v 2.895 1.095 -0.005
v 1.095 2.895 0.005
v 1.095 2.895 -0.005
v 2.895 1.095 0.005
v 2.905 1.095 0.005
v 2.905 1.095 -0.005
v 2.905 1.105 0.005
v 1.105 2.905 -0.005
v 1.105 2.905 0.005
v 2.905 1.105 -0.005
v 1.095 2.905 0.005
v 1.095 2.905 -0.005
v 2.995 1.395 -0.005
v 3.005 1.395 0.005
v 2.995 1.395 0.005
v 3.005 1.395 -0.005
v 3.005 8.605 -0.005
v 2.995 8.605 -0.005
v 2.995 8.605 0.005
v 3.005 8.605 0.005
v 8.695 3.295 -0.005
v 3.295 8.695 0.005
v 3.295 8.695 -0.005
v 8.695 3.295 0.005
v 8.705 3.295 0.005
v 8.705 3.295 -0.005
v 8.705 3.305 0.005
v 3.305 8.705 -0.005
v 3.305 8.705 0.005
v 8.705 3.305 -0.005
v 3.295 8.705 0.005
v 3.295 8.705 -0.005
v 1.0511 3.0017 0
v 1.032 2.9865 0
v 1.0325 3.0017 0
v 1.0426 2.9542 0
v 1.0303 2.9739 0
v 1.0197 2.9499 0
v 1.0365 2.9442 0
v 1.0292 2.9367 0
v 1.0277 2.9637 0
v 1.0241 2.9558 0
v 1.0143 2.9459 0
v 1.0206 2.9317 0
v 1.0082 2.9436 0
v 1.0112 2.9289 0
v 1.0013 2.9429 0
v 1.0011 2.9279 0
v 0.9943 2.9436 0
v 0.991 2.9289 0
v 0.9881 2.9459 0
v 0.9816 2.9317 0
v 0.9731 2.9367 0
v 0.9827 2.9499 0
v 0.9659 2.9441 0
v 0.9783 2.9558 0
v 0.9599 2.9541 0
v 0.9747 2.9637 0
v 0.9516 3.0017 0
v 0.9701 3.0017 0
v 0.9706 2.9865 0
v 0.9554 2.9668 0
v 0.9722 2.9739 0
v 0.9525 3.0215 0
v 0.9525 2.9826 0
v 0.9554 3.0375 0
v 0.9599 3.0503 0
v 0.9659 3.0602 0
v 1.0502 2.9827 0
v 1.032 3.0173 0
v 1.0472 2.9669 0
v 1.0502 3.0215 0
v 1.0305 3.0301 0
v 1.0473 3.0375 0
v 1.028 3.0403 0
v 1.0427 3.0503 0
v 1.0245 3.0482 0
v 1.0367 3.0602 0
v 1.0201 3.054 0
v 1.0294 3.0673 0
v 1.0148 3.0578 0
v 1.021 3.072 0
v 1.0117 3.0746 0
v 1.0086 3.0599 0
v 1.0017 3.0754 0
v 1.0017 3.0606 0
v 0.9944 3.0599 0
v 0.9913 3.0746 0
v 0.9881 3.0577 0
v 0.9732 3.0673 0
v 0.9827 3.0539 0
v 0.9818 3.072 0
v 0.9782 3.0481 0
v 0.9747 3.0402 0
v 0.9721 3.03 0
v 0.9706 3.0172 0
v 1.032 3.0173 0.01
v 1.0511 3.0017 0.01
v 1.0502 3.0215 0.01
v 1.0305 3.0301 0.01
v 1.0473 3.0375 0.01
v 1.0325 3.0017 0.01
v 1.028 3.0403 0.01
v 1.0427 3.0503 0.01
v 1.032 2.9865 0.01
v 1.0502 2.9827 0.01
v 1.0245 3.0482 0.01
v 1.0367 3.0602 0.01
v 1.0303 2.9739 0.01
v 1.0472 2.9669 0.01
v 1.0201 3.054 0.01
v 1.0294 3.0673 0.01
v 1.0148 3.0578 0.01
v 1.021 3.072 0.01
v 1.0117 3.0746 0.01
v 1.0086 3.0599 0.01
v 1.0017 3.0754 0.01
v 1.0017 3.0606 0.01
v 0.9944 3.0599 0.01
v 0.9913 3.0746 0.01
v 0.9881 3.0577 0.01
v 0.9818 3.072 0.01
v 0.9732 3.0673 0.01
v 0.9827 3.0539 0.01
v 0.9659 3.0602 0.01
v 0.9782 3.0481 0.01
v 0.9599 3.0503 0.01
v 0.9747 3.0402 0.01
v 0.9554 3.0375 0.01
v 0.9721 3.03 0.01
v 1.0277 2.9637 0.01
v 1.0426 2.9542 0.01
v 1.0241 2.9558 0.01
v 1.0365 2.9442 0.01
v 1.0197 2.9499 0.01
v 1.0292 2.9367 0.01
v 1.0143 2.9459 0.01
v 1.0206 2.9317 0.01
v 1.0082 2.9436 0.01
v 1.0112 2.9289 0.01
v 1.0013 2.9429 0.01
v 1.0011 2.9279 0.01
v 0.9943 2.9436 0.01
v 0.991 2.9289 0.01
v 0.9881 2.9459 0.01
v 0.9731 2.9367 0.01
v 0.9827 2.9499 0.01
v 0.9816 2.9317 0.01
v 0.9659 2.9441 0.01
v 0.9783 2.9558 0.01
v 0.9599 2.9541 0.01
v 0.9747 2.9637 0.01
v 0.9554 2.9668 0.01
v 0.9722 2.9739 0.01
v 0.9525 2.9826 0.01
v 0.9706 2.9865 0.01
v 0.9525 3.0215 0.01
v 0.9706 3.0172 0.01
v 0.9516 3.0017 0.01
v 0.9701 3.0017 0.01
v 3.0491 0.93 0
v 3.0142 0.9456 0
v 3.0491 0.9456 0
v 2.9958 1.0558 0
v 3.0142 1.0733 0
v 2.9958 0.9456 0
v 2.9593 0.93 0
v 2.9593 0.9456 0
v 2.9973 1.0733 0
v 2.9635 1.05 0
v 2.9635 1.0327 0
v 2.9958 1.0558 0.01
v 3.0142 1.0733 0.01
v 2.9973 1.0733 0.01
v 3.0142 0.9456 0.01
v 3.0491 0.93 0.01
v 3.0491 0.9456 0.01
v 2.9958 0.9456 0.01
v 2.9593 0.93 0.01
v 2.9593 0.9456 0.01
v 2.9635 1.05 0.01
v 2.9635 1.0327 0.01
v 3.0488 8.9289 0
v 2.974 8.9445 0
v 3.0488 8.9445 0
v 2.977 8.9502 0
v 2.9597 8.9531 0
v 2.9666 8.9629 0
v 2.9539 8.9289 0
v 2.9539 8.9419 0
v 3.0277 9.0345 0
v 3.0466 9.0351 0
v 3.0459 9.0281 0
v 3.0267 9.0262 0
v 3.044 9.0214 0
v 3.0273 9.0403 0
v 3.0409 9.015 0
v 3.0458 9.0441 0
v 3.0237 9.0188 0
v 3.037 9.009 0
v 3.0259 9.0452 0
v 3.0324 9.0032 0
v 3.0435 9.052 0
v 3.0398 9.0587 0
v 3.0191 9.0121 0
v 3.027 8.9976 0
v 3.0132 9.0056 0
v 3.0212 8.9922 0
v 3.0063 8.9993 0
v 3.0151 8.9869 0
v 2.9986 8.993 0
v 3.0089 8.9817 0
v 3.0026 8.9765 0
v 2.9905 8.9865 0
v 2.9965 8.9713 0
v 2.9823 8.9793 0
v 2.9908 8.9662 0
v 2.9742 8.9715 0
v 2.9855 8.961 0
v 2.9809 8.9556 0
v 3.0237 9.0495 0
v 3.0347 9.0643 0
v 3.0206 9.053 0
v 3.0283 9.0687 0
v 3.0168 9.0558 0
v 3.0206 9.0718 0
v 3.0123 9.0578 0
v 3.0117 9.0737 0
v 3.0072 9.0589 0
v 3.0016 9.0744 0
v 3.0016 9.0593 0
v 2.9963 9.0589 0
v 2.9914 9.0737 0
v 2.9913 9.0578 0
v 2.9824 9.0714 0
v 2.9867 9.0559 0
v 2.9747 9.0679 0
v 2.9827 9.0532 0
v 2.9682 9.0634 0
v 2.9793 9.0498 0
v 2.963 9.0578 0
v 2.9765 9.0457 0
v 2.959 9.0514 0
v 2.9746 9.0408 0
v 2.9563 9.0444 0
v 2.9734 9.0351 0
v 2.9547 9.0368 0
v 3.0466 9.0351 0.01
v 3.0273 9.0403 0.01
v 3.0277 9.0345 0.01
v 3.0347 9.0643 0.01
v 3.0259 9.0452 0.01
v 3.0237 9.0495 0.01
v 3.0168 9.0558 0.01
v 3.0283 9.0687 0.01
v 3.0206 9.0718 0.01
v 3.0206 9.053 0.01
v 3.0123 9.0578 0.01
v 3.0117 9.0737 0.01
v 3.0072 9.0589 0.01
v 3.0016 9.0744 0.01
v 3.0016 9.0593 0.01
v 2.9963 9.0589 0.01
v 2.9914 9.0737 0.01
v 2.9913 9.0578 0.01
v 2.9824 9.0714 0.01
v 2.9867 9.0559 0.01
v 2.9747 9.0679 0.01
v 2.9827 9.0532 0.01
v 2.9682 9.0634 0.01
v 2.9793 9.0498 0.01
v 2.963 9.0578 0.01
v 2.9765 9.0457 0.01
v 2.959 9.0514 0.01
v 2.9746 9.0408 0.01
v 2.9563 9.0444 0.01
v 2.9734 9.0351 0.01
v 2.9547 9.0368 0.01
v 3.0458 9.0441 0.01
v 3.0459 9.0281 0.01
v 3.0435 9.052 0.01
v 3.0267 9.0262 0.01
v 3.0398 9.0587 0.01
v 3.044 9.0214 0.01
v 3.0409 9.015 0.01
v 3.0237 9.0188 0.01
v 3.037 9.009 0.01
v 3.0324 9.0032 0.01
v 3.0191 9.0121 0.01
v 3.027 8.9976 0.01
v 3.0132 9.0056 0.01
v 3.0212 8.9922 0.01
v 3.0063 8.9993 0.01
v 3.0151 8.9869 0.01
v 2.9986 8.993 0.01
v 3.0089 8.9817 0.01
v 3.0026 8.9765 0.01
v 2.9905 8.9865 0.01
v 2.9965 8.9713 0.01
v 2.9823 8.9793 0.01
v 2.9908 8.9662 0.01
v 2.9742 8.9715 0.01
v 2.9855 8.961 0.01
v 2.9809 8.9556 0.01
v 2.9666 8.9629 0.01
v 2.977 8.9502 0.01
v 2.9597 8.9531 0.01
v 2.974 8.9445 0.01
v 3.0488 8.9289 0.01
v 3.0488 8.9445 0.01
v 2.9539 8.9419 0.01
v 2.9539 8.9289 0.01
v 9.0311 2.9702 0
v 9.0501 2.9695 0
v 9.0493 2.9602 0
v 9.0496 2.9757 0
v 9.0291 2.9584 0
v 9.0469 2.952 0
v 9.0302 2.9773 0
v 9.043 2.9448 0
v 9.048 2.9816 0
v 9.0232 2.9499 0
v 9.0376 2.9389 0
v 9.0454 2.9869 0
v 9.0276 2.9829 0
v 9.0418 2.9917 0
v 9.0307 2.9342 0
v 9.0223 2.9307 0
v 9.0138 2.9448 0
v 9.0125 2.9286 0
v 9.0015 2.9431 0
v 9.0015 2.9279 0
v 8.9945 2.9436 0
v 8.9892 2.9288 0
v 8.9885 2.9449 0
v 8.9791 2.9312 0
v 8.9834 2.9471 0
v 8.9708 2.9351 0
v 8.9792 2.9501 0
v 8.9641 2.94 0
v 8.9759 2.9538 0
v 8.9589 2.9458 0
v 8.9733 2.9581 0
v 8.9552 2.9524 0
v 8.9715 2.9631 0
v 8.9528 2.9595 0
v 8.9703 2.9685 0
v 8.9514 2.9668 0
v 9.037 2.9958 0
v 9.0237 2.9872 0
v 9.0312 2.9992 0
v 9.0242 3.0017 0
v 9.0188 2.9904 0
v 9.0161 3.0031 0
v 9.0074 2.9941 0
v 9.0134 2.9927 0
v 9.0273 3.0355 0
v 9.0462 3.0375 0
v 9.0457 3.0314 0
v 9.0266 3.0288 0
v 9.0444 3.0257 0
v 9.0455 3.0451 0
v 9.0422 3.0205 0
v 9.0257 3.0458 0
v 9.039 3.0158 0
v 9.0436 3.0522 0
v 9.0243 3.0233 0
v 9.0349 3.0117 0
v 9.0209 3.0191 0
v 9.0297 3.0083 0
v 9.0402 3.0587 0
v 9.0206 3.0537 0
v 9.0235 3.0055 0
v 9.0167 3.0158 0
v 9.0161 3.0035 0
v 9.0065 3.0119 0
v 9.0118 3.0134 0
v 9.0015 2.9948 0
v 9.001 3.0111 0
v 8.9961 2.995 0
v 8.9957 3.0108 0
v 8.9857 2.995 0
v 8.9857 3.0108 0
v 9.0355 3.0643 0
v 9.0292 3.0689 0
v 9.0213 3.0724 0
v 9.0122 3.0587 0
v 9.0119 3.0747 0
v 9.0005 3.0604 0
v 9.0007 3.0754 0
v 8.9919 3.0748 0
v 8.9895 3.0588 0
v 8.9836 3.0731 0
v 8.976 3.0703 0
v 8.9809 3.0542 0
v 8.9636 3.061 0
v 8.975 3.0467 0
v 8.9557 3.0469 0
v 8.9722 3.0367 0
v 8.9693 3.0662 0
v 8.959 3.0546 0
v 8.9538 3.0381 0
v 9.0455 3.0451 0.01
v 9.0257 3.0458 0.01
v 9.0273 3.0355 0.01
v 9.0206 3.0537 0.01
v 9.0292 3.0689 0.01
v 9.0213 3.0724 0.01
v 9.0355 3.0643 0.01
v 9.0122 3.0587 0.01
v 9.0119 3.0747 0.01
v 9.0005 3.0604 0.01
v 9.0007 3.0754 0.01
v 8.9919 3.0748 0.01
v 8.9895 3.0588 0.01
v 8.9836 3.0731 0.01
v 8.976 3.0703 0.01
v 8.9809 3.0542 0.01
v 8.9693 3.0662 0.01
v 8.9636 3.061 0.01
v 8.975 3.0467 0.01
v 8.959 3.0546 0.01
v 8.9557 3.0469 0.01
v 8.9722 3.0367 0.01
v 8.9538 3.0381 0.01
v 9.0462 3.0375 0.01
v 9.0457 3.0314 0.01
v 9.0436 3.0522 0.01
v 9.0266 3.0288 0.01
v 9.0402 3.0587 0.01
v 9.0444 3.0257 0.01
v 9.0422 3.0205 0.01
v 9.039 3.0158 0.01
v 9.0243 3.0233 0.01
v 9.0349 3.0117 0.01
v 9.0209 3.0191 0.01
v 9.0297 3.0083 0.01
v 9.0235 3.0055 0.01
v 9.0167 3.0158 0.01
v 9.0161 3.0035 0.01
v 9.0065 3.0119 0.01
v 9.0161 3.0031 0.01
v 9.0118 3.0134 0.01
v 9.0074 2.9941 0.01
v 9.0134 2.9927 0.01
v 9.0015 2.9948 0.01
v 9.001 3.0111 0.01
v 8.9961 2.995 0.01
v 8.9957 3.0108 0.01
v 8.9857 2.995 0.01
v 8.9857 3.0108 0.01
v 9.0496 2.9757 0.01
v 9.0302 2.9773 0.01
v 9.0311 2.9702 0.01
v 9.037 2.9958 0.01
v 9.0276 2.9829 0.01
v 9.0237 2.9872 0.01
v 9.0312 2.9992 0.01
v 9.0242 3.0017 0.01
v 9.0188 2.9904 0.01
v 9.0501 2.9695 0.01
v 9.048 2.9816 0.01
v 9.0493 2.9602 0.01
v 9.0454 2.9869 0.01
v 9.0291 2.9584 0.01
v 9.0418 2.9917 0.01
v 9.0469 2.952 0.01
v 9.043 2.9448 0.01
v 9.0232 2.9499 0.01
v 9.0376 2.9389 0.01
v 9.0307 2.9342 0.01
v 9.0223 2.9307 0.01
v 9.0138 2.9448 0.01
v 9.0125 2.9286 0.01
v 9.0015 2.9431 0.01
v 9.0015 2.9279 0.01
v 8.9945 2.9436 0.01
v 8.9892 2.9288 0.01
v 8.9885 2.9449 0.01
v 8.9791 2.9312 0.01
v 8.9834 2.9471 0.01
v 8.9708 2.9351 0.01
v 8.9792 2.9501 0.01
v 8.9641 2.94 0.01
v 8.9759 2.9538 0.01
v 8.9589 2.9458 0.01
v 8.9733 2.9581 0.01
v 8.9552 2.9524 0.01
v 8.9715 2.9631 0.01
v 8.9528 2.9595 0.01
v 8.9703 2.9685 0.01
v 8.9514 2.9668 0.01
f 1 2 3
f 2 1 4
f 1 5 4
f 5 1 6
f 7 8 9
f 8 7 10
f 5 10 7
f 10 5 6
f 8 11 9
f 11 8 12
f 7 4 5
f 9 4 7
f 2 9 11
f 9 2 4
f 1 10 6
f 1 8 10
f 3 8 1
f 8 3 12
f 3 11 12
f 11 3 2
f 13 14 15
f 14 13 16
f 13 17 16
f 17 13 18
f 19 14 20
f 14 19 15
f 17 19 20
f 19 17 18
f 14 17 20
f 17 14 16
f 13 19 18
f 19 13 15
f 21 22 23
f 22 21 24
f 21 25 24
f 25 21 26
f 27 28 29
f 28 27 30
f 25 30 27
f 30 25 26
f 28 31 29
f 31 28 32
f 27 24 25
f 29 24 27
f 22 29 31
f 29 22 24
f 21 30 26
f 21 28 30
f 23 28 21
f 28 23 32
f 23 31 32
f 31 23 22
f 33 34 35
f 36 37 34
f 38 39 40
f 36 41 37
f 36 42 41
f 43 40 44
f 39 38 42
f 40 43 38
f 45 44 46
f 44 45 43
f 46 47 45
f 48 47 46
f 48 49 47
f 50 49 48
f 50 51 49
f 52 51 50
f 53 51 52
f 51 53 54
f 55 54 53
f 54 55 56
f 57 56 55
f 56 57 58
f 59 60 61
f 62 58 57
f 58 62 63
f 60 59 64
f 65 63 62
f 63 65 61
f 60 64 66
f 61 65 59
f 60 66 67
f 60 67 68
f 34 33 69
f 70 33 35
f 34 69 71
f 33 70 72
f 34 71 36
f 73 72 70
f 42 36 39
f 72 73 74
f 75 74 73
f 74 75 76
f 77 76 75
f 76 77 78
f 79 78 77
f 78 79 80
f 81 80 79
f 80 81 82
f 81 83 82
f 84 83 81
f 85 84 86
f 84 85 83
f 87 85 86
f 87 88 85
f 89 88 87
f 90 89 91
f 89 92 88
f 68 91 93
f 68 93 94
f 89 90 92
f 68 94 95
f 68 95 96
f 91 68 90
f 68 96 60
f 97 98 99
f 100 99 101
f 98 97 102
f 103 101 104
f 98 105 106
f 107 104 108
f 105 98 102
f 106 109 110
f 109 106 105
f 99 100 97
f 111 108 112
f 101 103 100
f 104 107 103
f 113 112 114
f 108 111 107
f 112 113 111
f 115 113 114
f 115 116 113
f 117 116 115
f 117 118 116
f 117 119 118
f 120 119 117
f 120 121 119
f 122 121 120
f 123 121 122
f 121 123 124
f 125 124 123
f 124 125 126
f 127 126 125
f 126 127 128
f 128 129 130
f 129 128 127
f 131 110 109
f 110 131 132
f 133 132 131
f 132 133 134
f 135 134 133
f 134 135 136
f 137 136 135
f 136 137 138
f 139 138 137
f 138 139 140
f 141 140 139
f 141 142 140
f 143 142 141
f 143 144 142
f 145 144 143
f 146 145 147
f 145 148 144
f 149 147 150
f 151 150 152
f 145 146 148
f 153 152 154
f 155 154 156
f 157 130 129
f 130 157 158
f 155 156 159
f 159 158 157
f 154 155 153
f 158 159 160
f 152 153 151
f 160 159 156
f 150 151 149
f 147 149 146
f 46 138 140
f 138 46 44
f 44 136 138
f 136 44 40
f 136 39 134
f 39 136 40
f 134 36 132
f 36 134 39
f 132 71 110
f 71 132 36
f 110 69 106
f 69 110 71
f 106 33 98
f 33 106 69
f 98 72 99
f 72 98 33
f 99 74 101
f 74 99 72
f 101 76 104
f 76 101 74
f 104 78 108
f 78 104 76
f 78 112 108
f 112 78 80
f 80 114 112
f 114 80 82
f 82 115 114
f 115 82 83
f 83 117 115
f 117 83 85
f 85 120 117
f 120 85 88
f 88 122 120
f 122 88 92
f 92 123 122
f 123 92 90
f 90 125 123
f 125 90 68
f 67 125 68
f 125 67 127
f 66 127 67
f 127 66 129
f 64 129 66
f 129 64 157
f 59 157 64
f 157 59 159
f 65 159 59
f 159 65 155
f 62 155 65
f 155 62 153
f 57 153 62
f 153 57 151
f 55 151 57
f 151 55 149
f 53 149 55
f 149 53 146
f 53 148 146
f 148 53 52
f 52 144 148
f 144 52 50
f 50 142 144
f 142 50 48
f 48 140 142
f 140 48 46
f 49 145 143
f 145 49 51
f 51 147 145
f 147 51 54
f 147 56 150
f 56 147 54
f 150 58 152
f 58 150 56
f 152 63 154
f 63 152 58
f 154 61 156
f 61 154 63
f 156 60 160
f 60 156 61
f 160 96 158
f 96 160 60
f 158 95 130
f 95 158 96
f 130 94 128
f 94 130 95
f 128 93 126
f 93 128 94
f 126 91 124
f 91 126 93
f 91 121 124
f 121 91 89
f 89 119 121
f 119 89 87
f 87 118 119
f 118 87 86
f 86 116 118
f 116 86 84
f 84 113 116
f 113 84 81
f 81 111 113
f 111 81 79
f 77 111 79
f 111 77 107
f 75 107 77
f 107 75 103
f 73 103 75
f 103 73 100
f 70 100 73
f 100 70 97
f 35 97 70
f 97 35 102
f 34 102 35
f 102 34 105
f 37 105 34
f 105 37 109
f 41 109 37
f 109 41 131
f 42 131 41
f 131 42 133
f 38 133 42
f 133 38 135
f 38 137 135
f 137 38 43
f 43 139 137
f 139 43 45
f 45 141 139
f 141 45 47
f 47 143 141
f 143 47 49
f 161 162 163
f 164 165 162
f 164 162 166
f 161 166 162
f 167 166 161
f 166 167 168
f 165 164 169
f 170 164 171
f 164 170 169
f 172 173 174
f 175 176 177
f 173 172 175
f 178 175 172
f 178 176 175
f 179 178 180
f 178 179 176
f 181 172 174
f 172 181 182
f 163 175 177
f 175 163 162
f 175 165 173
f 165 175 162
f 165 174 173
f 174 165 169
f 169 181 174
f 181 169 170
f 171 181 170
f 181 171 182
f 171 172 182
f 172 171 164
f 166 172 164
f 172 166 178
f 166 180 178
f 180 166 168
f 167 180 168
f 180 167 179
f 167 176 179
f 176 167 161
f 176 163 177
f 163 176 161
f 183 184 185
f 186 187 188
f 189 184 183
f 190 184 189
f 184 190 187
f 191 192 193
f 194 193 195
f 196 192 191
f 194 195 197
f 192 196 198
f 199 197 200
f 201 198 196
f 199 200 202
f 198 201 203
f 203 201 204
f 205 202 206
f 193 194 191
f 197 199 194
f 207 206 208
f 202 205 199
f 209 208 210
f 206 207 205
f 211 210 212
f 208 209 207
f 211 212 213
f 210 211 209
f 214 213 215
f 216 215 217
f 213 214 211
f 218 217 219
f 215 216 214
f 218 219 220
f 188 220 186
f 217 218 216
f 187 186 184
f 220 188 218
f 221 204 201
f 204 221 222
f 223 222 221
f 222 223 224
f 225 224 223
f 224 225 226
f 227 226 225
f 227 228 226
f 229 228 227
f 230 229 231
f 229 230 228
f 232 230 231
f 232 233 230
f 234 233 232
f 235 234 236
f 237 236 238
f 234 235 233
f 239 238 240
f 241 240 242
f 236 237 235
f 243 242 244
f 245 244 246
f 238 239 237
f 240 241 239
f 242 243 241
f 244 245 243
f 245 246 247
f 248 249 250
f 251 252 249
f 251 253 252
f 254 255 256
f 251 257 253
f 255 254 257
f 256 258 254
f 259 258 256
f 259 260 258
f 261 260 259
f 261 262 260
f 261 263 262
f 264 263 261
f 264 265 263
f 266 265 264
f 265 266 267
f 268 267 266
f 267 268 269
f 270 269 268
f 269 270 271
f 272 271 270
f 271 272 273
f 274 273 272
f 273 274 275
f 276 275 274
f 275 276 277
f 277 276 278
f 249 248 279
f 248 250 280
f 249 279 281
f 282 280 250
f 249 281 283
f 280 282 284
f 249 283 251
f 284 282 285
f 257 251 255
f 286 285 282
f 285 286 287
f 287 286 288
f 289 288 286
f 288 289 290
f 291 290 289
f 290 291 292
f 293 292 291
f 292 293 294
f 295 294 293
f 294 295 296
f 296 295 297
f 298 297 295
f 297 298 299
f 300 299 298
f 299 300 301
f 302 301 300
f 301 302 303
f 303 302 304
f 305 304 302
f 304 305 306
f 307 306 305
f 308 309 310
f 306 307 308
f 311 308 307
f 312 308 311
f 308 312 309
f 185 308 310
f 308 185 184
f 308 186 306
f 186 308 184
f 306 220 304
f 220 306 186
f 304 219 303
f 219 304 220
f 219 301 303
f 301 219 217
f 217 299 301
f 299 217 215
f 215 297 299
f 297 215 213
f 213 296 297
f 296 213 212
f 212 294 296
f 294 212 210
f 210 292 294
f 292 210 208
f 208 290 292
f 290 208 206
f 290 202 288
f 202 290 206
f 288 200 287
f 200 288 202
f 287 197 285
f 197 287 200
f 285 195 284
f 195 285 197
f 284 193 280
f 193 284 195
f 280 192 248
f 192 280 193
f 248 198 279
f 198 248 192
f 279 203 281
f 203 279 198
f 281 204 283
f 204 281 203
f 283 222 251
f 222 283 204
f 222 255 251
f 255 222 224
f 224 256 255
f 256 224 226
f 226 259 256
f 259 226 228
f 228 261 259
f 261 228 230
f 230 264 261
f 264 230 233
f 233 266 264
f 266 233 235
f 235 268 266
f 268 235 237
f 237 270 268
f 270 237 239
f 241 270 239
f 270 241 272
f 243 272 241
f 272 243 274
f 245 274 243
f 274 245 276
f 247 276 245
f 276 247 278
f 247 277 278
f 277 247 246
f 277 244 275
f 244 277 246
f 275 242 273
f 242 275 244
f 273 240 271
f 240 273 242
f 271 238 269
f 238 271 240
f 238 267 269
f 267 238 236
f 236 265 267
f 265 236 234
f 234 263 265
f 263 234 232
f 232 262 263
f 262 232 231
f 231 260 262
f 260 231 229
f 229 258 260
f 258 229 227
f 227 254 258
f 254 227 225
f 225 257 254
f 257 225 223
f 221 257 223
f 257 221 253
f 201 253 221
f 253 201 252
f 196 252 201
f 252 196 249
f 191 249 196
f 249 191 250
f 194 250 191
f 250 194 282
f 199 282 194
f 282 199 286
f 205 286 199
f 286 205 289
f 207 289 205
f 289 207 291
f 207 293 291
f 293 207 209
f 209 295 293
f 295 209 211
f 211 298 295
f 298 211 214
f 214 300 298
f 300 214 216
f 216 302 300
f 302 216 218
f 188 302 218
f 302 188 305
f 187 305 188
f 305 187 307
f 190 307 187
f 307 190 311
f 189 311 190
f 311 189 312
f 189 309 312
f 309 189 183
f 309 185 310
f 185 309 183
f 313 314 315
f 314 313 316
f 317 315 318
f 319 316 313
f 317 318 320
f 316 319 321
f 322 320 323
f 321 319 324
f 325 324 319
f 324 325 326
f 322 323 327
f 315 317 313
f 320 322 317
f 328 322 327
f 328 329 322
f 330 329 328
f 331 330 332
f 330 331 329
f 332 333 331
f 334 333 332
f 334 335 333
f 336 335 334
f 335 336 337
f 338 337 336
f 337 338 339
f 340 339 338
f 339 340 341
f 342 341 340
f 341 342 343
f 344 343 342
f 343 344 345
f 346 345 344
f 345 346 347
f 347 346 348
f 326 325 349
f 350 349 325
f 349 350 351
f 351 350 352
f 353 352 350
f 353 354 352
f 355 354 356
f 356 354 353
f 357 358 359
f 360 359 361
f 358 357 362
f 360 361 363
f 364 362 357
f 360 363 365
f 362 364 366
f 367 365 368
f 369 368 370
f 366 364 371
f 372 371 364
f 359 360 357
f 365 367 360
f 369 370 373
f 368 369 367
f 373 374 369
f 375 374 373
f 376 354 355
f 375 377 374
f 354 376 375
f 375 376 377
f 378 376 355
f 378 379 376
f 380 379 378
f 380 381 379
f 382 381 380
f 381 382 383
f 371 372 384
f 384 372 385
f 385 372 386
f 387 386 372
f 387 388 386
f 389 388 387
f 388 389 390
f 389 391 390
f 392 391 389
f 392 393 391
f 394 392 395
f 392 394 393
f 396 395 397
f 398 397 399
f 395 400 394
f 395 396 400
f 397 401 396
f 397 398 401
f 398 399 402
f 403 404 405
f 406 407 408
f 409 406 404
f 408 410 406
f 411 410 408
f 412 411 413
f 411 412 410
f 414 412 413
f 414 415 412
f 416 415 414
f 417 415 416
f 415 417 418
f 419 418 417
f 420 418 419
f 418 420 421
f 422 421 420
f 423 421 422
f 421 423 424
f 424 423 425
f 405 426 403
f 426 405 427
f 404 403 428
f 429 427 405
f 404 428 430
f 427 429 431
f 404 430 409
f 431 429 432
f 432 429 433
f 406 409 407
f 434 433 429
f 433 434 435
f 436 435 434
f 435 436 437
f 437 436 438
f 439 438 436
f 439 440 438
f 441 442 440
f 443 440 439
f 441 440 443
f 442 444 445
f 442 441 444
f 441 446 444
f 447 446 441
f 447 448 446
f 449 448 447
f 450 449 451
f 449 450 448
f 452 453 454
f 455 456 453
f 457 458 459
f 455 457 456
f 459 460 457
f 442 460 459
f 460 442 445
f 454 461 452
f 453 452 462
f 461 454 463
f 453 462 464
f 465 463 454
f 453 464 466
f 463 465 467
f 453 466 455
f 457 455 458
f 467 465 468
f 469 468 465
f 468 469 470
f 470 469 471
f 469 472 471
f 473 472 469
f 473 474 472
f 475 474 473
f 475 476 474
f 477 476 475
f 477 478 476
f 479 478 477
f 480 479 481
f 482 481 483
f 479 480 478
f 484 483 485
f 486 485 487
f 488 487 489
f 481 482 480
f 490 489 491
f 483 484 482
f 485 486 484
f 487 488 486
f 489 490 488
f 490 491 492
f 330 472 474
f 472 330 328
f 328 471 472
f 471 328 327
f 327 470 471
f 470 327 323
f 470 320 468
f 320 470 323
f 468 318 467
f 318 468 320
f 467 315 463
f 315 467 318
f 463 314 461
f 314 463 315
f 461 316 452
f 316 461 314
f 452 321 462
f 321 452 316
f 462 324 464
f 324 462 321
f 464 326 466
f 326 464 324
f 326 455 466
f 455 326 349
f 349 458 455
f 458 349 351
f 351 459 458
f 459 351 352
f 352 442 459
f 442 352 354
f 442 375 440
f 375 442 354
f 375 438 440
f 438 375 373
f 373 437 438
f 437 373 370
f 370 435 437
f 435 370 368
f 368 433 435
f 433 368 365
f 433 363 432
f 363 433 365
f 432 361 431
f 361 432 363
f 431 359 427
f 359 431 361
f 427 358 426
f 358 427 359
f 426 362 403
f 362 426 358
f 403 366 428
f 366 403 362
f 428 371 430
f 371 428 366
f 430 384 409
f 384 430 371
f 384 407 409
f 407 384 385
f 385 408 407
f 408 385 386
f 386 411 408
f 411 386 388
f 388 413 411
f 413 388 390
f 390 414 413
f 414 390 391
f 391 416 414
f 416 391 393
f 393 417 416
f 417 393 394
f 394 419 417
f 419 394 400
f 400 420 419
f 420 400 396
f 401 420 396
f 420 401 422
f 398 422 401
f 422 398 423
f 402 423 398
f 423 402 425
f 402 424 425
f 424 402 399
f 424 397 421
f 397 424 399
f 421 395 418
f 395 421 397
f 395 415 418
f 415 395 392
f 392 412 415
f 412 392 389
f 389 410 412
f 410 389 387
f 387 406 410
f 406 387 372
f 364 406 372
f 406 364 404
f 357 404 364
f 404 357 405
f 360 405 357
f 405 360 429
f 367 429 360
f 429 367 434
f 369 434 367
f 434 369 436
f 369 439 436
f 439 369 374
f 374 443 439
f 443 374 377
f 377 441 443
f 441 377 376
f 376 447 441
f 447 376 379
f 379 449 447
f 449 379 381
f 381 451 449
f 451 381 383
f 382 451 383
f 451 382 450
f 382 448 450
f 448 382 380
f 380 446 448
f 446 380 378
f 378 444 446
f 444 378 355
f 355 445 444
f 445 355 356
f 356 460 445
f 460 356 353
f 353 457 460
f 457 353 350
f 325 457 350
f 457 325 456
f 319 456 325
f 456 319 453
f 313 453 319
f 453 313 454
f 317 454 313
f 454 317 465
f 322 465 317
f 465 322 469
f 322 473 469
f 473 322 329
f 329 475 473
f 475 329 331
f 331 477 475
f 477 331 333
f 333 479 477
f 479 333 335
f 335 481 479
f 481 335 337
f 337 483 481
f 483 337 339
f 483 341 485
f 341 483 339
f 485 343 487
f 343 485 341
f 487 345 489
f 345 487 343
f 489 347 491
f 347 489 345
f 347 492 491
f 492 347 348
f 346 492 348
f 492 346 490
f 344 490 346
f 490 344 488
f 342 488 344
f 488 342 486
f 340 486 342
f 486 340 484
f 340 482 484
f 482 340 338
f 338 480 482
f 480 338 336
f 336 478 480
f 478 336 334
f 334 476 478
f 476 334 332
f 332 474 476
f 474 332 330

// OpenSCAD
hull() {
    translate([1.1, 2.9000000000000004, 0]) cube([0.01, 0.01, 0.01], center=true);
    translate([2.9000000000000004, 1.1, 0]) cube([0.01, 0.01, 0.01], center=true);
}


hull() {
    translate([3.0, 1.4, 0]) cube([0.01, 0.01, 0.01], center=true);
    translate([3.0, 8.6, 0]) cube([0.01, 0.01, 0.01], center=true);
}


hull() {
    translate([3.3000000000000003, 8.7, 0]) cube([0.01, 0.01, 0.01], center=true);
    translate([8.7, 3.3000000000000003, 0]) cube([0.01, 0.01, 0.01], center=true);
}


translate([1, 3, 0]) linear_extrude(0.01) text("0",size=0.15, halign="center", valign="center");

translate([3, 1, 0]) linear_extrude(0.01) text("1",size=0.15, halign="center", valign="center");

translate([3, 9, 0]) linear_extrude(0.01) text("2",size=0.15, halign="center", valign="center");

translate([9, 3, 0]) linear_extrude(0.01) text("3",size=0.15, halign="center", valign="center");
